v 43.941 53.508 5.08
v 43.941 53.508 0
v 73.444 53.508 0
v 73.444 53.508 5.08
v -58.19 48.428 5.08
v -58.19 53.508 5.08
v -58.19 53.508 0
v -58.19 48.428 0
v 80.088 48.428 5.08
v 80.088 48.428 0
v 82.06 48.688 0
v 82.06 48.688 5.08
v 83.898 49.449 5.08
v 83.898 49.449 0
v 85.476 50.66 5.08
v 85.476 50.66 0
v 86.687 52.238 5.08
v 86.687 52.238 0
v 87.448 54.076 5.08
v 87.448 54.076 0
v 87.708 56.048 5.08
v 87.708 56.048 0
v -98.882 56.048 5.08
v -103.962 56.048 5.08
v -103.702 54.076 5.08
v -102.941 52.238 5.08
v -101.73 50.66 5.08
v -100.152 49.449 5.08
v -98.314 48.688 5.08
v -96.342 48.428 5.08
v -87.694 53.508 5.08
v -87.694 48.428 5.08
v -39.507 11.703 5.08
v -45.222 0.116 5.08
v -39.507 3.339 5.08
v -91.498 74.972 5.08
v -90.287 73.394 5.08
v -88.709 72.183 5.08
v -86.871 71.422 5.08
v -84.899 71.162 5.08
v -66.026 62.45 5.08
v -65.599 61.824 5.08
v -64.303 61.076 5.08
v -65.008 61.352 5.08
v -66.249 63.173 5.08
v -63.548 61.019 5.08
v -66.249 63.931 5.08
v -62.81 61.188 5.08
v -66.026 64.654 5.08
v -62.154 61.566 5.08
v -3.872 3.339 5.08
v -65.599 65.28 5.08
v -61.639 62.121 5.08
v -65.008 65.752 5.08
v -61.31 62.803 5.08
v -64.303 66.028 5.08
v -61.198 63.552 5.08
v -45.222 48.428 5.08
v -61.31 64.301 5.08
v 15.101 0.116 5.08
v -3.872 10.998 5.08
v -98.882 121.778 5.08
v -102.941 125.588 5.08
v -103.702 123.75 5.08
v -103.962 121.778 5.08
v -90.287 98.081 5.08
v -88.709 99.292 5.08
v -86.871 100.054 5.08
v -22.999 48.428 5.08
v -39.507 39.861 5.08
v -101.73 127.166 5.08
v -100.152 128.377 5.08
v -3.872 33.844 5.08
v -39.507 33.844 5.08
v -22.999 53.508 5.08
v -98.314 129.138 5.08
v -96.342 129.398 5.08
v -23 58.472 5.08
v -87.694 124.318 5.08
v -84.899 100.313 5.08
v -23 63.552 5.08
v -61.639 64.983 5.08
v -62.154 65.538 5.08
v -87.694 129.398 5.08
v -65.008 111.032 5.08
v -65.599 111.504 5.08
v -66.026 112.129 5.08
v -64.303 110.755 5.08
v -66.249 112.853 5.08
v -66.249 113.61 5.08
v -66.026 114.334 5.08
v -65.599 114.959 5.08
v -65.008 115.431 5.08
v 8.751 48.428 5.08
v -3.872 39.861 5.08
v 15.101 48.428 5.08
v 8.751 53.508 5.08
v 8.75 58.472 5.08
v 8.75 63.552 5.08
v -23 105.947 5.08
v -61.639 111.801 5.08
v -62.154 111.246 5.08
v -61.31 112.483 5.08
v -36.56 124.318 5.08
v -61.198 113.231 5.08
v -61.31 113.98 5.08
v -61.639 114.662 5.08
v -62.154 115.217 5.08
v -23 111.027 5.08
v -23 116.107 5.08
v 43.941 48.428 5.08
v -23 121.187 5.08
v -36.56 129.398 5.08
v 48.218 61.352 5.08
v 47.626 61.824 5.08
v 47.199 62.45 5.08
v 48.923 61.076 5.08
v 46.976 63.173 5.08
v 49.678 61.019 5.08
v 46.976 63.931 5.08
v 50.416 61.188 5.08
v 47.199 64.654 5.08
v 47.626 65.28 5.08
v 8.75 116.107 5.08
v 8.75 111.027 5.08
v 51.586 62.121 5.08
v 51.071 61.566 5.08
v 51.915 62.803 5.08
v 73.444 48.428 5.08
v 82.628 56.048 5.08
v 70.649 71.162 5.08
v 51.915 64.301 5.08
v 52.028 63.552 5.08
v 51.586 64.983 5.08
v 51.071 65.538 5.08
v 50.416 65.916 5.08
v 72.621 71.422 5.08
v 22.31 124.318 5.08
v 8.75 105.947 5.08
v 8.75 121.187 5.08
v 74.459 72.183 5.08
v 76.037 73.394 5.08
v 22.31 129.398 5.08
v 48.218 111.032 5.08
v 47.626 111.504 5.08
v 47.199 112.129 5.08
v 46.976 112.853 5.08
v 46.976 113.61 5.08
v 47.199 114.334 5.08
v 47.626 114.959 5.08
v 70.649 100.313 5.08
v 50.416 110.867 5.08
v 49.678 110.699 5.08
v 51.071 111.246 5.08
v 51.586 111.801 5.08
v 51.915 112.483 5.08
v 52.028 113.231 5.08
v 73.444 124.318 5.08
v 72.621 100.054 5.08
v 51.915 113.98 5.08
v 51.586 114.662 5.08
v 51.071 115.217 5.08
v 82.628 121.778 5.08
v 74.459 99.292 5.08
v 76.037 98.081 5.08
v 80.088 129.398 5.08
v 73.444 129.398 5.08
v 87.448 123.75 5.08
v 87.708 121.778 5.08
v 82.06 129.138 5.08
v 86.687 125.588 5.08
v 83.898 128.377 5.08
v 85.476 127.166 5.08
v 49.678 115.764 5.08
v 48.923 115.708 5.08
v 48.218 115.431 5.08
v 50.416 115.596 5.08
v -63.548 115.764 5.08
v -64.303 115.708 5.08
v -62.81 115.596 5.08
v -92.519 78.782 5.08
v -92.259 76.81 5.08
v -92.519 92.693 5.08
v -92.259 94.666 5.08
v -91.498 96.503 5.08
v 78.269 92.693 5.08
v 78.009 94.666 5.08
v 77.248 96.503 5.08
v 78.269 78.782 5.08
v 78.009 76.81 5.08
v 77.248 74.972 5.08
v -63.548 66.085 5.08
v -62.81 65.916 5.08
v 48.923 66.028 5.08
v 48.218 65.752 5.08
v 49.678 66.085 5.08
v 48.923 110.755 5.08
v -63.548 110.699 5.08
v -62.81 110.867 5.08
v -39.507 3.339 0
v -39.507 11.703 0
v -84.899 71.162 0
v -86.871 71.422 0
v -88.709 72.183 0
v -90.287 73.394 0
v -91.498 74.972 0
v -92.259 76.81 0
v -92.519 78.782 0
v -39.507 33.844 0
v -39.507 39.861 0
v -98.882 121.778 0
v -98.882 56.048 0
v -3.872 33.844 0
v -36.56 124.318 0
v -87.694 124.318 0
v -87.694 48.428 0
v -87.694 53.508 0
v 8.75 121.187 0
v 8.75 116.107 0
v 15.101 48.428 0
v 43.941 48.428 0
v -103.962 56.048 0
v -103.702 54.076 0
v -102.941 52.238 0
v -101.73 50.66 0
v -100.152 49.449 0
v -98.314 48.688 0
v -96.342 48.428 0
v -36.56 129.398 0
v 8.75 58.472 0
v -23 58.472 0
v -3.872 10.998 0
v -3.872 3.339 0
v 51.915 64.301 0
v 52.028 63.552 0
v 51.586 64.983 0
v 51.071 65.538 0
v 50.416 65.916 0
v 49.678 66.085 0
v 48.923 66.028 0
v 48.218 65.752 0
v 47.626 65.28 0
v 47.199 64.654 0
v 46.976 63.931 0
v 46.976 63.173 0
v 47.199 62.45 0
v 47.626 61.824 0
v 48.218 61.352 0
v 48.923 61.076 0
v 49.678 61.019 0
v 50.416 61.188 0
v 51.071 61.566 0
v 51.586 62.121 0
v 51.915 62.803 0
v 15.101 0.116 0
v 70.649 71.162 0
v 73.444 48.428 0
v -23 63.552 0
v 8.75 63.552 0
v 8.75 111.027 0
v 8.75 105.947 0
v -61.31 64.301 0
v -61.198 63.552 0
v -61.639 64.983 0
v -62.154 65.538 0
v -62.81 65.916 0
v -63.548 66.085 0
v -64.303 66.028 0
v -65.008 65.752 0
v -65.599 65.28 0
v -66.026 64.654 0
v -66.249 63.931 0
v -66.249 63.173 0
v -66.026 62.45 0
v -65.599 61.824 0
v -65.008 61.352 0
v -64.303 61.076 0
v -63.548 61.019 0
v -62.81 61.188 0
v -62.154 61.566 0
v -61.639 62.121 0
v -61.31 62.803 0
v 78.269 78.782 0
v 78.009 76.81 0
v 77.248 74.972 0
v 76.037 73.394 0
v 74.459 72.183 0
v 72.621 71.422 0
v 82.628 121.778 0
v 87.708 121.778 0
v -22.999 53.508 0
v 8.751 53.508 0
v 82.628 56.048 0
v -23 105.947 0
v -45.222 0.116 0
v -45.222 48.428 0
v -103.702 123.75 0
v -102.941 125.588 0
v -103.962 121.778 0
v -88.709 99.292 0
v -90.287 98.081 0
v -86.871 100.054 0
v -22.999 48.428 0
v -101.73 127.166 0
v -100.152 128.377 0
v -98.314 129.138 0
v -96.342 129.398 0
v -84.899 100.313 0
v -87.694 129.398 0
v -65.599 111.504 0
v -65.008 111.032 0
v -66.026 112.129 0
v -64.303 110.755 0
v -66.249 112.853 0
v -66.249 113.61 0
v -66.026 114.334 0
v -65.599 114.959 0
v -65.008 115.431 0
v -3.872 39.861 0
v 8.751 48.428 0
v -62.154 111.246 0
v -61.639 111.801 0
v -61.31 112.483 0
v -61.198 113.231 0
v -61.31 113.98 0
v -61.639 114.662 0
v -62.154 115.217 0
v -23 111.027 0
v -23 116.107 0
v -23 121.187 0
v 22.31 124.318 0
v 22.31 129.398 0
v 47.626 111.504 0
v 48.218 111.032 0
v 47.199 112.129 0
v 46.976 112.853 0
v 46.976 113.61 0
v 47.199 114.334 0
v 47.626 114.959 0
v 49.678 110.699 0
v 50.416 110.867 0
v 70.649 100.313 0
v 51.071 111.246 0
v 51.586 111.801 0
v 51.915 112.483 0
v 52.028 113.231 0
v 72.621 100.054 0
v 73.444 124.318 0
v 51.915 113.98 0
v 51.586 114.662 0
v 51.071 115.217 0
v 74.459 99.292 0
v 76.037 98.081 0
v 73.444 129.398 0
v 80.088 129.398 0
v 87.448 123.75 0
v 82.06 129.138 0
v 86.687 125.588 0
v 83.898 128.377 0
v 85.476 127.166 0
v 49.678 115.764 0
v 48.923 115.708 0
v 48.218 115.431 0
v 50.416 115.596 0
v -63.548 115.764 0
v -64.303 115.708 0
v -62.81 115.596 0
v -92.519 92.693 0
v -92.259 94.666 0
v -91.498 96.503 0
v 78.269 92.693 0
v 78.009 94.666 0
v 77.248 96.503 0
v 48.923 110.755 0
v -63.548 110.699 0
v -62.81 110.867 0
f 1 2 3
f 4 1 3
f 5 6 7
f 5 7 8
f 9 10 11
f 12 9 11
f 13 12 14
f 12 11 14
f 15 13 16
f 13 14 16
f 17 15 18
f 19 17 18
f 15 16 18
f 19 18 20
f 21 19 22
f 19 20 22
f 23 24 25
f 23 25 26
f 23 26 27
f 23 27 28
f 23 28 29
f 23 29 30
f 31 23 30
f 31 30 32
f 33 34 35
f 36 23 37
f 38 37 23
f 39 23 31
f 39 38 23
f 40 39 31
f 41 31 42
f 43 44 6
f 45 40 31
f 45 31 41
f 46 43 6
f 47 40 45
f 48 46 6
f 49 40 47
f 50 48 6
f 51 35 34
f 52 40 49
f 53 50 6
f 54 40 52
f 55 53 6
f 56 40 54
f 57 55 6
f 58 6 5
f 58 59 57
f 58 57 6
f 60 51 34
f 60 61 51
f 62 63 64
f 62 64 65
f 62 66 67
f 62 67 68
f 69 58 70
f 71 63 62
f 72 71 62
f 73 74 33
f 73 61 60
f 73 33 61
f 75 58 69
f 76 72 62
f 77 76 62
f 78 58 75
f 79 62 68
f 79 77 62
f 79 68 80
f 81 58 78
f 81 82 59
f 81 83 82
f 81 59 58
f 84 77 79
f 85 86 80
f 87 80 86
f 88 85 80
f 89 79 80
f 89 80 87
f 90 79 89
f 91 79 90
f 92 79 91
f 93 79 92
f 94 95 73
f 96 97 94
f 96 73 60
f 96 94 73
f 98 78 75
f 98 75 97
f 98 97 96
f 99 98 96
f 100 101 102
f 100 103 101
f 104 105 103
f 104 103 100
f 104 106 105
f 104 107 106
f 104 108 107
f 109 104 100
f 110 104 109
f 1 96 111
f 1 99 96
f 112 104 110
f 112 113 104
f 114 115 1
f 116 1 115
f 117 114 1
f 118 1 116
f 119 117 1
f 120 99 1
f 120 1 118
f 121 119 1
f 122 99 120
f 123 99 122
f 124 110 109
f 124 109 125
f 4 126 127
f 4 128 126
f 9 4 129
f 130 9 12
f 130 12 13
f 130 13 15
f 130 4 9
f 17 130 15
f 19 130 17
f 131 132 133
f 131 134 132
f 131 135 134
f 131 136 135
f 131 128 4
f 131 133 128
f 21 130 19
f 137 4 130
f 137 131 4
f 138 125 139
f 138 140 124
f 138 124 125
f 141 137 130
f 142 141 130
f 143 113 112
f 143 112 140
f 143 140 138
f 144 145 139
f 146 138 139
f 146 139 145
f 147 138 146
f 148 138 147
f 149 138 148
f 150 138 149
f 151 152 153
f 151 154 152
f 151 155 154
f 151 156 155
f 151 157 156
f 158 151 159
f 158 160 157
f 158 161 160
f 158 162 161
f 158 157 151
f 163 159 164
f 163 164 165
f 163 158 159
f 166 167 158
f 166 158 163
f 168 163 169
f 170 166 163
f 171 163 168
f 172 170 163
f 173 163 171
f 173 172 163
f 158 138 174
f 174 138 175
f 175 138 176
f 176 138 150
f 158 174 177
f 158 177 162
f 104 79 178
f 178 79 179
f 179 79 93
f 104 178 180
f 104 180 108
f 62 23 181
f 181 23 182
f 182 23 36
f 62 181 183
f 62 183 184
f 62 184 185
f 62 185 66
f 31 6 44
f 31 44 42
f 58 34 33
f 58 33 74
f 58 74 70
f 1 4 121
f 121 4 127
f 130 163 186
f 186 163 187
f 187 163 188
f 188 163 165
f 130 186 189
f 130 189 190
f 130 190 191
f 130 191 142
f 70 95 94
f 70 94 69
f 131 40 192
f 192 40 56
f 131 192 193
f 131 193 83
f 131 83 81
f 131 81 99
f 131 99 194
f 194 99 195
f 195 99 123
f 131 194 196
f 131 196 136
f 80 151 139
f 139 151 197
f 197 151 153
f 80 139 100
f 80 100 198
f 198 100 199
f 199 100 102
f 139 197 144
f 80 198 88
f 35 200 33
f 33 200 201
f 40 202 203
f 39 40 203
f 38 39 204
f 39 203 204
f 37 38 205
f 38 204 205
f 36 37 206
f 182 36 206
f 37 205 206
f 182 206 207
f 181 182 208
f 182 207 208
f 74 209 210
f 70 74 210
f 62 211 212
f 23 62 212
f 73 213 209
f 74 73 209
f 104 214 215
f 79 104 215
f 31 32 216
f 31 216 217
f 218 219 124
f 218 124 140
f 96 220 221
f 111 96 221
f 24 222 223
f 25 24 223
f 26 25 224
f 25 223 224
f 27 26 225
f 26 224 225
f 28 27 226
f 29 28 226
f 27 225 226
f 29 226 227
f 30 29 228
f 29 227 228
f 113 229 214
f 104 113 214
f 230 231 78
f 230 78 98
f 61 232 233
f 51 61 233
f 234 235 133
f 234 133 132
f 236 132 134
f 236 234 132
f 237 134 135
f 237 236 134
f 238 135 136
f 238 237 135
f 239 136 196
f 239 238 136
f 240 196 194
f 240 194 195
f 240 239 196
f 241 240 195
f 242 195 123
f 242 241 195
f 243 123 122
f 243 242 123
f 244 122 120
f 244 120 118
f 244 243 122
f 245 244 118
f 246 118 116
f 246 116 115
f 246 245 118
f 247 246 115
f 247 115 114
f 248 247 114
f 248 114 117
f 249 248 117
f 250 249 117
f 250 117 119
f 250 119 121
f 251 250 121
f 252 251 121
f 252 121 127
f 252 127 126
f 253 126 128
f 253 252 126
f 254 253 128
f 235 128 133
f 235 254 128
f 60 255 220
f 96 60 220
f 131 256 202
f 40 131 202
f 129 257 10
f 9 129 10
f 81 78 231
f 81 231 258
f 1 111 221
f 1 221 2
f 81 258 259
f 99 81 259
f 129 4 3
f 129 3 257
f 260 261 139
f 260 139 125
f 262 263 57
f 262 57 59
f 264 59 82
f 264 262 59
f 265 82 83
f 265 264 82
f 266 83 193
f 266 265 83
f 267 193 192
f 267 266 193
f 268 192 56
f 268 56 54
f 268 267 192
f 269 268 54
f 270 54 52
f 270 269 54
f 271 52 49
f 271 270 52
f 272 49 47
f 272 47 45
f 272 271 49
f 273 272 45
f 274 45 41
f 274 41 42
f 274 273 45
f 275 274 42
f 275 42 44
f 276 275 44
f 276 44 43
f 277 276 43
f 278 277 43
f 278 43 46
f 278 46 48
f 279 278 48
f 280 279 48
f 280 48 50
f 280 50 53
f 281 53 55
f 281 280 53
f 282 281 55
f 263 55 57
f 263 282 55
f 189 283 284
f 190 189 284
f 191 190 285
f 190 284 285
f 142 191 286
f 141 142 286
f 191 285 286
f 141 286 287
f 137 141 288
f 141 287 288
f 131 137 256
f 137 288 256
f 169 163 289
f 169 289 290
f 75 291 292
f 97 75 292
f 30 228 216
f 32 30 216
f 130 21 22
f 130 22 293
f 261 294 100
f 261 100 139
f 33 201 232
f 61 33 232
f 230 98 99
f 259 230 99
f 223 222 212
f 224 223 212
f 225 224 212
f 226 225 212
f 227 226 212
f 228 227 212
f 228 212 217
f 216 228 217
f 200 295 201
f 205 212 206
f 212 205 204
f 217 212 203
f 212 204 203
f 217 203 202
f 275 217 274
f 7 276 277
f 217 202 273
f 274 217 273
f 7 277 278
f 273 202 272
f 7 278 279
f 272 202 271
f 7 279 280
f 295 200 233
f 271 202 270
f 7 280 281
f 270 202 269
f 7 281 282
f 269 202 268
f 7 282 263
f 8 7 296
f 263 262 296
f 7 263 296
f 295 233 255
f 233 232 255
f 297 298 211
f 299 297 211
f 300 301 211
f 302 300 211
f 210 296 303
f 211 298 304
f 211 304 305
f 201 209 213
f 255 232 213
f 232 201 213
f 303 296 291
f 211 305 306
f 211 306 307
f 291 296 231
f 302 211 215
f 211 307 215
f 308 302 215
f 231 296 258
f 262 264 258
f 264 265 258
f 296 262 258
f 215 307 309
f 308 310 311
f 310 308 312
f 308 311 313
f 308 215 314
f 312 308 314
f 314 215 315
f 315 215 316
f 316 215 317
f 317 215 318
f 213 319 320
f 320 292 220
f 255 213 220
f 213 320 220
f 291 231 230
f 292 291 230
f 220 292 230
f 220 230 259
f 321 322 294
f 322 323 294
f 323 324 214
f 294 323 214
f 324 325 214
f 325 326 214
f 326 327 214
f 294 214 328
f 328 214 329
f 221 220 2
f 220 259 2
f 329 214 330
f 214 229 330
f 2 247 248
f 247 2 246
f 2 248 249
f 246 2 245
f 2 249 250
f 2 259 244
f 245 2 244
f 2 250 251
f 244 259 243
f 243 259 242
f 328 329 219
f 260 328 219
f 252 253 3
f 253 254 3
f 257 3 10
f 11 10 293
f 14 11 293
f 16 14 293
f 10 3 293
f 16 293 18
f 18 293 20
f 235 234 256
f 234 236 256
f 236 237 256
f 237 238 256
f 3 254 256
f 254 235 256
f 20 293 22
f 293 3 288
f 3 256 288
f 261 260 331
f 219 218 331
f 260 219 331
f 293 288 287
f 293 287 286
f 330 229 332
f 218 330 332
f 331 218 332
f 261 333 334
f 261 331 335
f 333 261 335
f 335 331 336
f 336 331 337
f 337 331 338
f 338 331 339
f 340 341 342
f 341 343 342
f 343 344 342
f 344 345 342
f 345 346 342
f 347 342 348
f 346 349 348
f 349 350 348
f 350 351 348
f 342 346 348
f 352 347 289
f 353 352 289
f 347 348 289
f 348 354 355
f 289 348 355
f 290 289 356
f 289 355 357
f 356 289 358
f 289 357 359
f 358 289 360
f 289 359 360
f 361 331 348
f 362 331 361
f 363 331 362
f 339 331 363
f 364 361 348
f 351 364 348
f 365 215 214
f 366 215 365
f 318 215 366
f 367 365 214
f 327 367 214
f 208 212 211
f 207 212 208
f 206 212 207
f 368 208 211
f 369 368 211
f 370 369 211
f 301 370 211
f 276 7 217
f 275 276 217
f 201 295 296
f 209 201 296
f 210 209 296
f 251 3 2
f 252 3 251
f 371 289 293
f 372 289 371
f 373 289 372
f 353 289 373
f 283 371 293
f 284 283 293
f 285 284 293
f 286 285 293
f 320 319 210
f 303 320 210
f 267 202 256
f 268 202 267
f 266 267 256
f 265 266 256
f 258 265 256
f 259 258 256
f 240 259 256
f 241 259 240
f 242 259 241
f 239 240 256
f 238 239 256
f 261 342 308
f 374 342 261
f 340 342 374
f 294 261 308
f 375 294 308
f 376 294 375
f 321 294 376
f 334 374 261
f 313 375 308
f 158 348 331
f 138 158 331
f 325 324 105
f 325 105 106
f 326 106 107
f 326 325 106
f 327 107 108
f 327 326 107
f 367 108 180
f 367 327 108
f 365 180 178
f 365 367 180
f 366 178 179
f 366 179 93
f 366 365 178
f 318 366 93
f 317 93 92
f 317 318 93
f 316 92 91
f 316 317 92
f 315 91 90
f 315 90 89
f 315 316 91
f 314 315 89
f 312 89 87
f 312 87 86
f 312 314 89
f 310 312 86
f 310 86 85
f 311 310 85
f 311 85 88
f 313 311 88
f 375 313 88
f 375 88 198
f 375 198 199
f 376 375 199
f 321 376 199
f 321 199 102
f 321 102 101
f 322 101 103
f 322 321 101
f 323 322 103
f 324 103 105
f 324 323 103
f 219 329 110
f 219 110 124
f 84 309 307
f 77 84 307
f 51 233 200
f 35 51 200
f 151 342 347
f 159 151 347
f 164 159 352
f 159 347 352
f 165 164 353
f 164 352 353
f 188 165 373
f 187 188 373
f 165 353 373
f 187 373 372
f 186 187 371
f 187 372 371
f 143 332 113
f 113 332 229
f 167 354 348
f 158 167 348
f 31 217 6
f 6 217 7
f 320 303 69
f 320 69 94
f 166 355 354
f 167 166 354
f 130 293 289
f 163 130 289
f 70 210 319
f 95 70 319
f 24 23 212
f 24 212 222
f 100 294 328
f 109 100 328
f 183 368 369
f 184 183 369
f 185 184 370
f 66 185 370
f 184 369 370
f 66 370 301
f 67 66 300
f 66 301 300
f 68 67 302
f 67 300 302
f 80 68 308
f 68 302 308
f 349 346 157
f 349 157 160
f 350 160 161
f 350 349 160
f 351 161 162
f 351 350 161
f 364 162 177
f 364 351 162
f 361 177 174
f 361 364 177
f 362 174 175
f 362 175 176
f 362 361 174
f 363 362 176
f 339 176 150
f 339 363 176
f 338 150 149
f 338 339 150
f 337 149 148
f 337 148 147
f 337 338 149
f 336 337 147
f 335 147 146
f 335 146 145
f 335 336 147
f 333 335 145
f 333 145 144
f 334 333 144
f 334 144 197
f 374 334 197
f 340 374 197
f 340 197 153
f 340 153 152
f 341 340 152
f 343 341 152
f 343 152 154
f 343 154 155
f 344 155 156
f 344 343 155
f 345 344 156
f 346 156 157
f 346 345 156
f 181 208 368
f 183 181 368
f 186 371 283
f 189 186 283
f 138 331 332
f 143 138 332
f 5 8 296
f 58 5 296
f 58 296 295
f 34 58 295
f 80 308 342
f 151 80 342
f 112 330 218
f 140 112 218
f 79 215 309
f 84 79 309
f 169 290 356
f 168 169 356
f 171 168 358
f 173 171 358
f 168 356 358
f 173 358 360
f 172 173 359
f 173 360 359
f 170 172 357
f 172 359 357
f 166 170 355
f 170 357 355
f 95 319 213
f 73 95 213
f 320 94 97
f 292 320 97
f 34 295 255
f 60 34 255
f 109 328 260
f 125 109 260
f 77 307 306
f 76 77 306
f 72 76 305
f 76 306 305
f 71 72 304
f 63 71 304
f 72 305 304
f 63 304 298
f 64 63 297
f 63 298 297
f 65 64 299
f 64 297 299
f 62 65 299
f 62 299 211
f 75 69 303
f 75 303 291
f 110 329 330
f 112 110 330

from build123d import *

# Parameters (mm, degrees)
SKETCH1_R           = 2.54
SKETCH1_W           = 31.75
SKETCH1_H           = 5.08
BOSS_EXTRUDE1_DEPTH = 5.08


with BuildPart() as part:
    # Sketch1 → Boss-Extrude1 (new body)
    with BuildSketch(Plane.XY):
        with BuildLine():
            Line((73.443857446, 124.317776281), (22.310144528, 124.317776281))
            Line((22.310144528, 124.317776281), (22.310144528, 129.397776281))
            Line((22.310144528, 129.397776281), (14.0979145, 129.397776281))
            Line((14.0979145, 129.397776281), (-30.3520855, 129.397776281))
            Line((-30.3520855, 129.397776281), (-36.559880198, 129.397776281))
            Line((-36.559880198, 129.397776281), (-36.559880198, 124.317776281))
            Line((-36.559880198, 124.317776281), (-87.693593116, 124.317776281))
            Line((-87.693593116, 124.317776281), (-87.693593116, 129.397776281))
            Line((-87.693593116, 129.397776281), (-96.342075919, 129.397776281))
            ThreePointArc((-96.342075919, 129.397776281), (-101.730229592, 127.165929953), (-103.962075919, 121.777776281))
            Line((-103.962075919, 121.777776281), (-98.882075919, 121.777776281))
            Line((-98.882075919, 121.777776281), (-98.882075919, 56.048326859))
            Line((-98.882075919, 56.048326859), (-103.962075919, 56.048326859))
            ThreePointArc((-103.962075919, 56.048326859), (-101.730229592, 50.660173186), (-96.342075919, 48.428326859))
            Line((-96.342075919, 48.428326859), (-87.693593116, 48.428326859))
            Line((-87.693593116, 48.428326859), (-87.693593116, 53.508326859))
            Line((-87.693593116, 53.508326859), (-58.190357776, 53.508326859))
            Line((-58.190357776, 53.508326859), (-58.190357776, 48.428326859))
            Line((-58.190357776, 48.428326859), (-45.221913897, 48.428326859))
            Line((-45.221913897, 48.428326859), (-45.221913897, 0.116289741))
            Line((-45.221913897, 0.116289741), (-7.123980427, 0.116289741))
            Line((-7.123980427, 0.116289741), (15.101019573, 0.116289741))
            Line((15.101019573, 0.116289741), (15.101019573, 48.428326859))
            Line((15.101019573, 48.428326859), (32.202561113, 48.428326859))
            Line((32.202561113, 48.428326859), (43.940622107, 48.428326859))
            Line((43.940622107, 48.428326859), (43.940622107, 53.508326859))
            Line((43.940622107, 53.508326859), (73.443857446, 53.508326859))
            Line((73.443857446, 53.508326859), (73.443857446, 48.428326859))
            Line((73.443857446, 48.428326859), (80.087904918, 48.428326859))
            ThreePointArc((80.087904918, 48.428326859), (85.476058591, 50.660173186), (87.707904918, 56.048326859))
            Line((87.707904918, 56.048326859), (82.627904918, 56.048326859))
            Line((82.627904918, 56.048326859), (82.627904918, 116.106668145))
            Line((82.627904918, 116.106668145), (82.627904918, 121.777776281))
            Line((82.627904918, 121.777776281), (87.707904918, 121.777776281))
            ThreePointArc((87.707904918, 121.777776281), (85.476058591, 127.165929953), (80.087904918, 129.397776281))
            Line((80.087904918, 129.397776281), (73.443857446, 129.397776281))
            Line((73.443857446, 129.397776281), (73.443857446, 124.317776281))
        make_face()
        Polygon((-3.872275334, 3.339373144), (-39.506956929, 3.339373144), (-39.506956929, 11.703040428), (-3.872275334, 10.997950476), align=None, mode=Mode.SUBTRACT)
        with Locations((-63.737543347, 63.552037118)):
            Circle(SKETCH1_R, mode=Mode.SUBTRACT)
        Polygon((-39.506956929, 39.861286156), (-29.349867835, 39.861286156), (-3.872275334, 39.861286156), (-3.872275334, 33.84416171), (-39.506956929, 33.84416171), align=None, mode=Mode.SUBTRACT)
        with Locations((-7.123980427, 50.968326859)):
            Rectangle(SKETCH1_W, SKETCH1_H, mode=Mode.SUBTRACT)
        with Locations((-7.124867835, 61.012037118)):
            Rectangle(SKETCH1_W, SKETCH1_H, mode=Mode.SUBTRACT)
        with Locations((49.487807678, 63.552037118)):
            Circle(SKETCH1_R, mode=Mode.SUBTRACT)
        with Locations((-63.737543347, 113.231437191)):
            Circle(SKETCH1_R, mode=Mode.SUBTRACT)
        with BuildLine():
            Line((70.649018329, 71.162232039), (-84.898753999, 71.162232039))
            ThreePointArc((-84.898753999, 71.162232039), (-90.286907671, 73.394078367), (-92.518753999, 78.782232039))
            Line((-92.518753999, 78.782232039), (-92.518753999, 92.693311063))
            ThreePointArc((-92.518753999, 92.693311063), (-90.286907671, 98.081464736), (-84.898753999, 100.313311063))
            Line((-84.898753999, 100.313311063), (70.649018329, 100.313311063))
            ThreePointArc((70.649018329, 100.313311063), (76.037172002, 98.081464736), (78.269018329, 92.693311063))
            Line((78.269018329, 92.693311063), (78.269018329, 78.782232039))
            ThreePointArc((78.269018329, 78.782232039), (76.037172002, 73.394078367), (70.649018329, 71.162232039))
        make_face(mode=Mode.SUBTRACT)
        with Locations((-7.124867835, 108.486668145)):
            Rectangle(SKETCH1_W, SKETCH1_H, mode=Mode.SUBTRACT)
        with Locations((-7.124867835, 118.646668145)):
            Rectangle(SKETCH1_W, SKETCH1_H, mode=Mode.SUBTRACT)
        with Locations((49.487807678, 113.231437191)):
            Circle(SKETCH1_R, mode=Mode.SUBTRACT)
    extrude(amount=BOSS_EXTRUDE1_DEPTH)


solid = part.part
